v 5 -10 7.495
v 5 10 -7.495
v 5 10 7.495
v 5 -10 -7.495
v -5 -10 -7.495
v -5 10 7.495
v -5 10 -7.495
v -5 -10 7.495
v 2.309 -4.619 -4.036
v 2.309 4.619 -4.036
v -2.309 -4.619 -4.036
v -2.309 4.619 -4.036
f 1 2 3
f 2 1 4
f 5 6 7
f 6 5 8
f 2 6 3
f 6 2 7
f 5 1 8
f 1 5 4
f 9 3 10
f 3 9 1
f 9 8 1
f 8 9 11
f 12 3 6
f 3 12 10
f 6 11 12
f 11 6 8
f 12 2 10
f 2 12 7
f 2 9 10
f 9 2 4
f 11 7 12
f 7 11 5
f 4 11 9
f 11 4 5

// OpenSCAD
// makes a double ended tapered cube.

module taper_cube(  big = [10, 20], 
                    small = [3, 6], 
                    height=15, 
                    indent_pct=10)
{
    difference()
    {
        cube ([ big.x, big.y, height],center=true);
        
        translate([0, 0, height/2])
        union ()
        {
            hull()
            {
                cube([ big.x, big.y, .01],center=true);
                translate([ 0, 0, -height])
                cube ([ small.x, small.y, .01],center=true);
            }
        }

        indent = height * indent_pct/100;
        translate([0, 0, -height/2 + indent])
        union ()
        {
            #hull()
            {
                cube ([ small.x, small.y, .01],center=true);
                translate([ 0, 0, -indent])
                cube([ big.x, big.y, .01],center=true);
            }
        }

    }
}


//make_bar(10);
//make_drip([ 3*25.4 , 2*25.4]);
taper_cube(indent_pct=30);
